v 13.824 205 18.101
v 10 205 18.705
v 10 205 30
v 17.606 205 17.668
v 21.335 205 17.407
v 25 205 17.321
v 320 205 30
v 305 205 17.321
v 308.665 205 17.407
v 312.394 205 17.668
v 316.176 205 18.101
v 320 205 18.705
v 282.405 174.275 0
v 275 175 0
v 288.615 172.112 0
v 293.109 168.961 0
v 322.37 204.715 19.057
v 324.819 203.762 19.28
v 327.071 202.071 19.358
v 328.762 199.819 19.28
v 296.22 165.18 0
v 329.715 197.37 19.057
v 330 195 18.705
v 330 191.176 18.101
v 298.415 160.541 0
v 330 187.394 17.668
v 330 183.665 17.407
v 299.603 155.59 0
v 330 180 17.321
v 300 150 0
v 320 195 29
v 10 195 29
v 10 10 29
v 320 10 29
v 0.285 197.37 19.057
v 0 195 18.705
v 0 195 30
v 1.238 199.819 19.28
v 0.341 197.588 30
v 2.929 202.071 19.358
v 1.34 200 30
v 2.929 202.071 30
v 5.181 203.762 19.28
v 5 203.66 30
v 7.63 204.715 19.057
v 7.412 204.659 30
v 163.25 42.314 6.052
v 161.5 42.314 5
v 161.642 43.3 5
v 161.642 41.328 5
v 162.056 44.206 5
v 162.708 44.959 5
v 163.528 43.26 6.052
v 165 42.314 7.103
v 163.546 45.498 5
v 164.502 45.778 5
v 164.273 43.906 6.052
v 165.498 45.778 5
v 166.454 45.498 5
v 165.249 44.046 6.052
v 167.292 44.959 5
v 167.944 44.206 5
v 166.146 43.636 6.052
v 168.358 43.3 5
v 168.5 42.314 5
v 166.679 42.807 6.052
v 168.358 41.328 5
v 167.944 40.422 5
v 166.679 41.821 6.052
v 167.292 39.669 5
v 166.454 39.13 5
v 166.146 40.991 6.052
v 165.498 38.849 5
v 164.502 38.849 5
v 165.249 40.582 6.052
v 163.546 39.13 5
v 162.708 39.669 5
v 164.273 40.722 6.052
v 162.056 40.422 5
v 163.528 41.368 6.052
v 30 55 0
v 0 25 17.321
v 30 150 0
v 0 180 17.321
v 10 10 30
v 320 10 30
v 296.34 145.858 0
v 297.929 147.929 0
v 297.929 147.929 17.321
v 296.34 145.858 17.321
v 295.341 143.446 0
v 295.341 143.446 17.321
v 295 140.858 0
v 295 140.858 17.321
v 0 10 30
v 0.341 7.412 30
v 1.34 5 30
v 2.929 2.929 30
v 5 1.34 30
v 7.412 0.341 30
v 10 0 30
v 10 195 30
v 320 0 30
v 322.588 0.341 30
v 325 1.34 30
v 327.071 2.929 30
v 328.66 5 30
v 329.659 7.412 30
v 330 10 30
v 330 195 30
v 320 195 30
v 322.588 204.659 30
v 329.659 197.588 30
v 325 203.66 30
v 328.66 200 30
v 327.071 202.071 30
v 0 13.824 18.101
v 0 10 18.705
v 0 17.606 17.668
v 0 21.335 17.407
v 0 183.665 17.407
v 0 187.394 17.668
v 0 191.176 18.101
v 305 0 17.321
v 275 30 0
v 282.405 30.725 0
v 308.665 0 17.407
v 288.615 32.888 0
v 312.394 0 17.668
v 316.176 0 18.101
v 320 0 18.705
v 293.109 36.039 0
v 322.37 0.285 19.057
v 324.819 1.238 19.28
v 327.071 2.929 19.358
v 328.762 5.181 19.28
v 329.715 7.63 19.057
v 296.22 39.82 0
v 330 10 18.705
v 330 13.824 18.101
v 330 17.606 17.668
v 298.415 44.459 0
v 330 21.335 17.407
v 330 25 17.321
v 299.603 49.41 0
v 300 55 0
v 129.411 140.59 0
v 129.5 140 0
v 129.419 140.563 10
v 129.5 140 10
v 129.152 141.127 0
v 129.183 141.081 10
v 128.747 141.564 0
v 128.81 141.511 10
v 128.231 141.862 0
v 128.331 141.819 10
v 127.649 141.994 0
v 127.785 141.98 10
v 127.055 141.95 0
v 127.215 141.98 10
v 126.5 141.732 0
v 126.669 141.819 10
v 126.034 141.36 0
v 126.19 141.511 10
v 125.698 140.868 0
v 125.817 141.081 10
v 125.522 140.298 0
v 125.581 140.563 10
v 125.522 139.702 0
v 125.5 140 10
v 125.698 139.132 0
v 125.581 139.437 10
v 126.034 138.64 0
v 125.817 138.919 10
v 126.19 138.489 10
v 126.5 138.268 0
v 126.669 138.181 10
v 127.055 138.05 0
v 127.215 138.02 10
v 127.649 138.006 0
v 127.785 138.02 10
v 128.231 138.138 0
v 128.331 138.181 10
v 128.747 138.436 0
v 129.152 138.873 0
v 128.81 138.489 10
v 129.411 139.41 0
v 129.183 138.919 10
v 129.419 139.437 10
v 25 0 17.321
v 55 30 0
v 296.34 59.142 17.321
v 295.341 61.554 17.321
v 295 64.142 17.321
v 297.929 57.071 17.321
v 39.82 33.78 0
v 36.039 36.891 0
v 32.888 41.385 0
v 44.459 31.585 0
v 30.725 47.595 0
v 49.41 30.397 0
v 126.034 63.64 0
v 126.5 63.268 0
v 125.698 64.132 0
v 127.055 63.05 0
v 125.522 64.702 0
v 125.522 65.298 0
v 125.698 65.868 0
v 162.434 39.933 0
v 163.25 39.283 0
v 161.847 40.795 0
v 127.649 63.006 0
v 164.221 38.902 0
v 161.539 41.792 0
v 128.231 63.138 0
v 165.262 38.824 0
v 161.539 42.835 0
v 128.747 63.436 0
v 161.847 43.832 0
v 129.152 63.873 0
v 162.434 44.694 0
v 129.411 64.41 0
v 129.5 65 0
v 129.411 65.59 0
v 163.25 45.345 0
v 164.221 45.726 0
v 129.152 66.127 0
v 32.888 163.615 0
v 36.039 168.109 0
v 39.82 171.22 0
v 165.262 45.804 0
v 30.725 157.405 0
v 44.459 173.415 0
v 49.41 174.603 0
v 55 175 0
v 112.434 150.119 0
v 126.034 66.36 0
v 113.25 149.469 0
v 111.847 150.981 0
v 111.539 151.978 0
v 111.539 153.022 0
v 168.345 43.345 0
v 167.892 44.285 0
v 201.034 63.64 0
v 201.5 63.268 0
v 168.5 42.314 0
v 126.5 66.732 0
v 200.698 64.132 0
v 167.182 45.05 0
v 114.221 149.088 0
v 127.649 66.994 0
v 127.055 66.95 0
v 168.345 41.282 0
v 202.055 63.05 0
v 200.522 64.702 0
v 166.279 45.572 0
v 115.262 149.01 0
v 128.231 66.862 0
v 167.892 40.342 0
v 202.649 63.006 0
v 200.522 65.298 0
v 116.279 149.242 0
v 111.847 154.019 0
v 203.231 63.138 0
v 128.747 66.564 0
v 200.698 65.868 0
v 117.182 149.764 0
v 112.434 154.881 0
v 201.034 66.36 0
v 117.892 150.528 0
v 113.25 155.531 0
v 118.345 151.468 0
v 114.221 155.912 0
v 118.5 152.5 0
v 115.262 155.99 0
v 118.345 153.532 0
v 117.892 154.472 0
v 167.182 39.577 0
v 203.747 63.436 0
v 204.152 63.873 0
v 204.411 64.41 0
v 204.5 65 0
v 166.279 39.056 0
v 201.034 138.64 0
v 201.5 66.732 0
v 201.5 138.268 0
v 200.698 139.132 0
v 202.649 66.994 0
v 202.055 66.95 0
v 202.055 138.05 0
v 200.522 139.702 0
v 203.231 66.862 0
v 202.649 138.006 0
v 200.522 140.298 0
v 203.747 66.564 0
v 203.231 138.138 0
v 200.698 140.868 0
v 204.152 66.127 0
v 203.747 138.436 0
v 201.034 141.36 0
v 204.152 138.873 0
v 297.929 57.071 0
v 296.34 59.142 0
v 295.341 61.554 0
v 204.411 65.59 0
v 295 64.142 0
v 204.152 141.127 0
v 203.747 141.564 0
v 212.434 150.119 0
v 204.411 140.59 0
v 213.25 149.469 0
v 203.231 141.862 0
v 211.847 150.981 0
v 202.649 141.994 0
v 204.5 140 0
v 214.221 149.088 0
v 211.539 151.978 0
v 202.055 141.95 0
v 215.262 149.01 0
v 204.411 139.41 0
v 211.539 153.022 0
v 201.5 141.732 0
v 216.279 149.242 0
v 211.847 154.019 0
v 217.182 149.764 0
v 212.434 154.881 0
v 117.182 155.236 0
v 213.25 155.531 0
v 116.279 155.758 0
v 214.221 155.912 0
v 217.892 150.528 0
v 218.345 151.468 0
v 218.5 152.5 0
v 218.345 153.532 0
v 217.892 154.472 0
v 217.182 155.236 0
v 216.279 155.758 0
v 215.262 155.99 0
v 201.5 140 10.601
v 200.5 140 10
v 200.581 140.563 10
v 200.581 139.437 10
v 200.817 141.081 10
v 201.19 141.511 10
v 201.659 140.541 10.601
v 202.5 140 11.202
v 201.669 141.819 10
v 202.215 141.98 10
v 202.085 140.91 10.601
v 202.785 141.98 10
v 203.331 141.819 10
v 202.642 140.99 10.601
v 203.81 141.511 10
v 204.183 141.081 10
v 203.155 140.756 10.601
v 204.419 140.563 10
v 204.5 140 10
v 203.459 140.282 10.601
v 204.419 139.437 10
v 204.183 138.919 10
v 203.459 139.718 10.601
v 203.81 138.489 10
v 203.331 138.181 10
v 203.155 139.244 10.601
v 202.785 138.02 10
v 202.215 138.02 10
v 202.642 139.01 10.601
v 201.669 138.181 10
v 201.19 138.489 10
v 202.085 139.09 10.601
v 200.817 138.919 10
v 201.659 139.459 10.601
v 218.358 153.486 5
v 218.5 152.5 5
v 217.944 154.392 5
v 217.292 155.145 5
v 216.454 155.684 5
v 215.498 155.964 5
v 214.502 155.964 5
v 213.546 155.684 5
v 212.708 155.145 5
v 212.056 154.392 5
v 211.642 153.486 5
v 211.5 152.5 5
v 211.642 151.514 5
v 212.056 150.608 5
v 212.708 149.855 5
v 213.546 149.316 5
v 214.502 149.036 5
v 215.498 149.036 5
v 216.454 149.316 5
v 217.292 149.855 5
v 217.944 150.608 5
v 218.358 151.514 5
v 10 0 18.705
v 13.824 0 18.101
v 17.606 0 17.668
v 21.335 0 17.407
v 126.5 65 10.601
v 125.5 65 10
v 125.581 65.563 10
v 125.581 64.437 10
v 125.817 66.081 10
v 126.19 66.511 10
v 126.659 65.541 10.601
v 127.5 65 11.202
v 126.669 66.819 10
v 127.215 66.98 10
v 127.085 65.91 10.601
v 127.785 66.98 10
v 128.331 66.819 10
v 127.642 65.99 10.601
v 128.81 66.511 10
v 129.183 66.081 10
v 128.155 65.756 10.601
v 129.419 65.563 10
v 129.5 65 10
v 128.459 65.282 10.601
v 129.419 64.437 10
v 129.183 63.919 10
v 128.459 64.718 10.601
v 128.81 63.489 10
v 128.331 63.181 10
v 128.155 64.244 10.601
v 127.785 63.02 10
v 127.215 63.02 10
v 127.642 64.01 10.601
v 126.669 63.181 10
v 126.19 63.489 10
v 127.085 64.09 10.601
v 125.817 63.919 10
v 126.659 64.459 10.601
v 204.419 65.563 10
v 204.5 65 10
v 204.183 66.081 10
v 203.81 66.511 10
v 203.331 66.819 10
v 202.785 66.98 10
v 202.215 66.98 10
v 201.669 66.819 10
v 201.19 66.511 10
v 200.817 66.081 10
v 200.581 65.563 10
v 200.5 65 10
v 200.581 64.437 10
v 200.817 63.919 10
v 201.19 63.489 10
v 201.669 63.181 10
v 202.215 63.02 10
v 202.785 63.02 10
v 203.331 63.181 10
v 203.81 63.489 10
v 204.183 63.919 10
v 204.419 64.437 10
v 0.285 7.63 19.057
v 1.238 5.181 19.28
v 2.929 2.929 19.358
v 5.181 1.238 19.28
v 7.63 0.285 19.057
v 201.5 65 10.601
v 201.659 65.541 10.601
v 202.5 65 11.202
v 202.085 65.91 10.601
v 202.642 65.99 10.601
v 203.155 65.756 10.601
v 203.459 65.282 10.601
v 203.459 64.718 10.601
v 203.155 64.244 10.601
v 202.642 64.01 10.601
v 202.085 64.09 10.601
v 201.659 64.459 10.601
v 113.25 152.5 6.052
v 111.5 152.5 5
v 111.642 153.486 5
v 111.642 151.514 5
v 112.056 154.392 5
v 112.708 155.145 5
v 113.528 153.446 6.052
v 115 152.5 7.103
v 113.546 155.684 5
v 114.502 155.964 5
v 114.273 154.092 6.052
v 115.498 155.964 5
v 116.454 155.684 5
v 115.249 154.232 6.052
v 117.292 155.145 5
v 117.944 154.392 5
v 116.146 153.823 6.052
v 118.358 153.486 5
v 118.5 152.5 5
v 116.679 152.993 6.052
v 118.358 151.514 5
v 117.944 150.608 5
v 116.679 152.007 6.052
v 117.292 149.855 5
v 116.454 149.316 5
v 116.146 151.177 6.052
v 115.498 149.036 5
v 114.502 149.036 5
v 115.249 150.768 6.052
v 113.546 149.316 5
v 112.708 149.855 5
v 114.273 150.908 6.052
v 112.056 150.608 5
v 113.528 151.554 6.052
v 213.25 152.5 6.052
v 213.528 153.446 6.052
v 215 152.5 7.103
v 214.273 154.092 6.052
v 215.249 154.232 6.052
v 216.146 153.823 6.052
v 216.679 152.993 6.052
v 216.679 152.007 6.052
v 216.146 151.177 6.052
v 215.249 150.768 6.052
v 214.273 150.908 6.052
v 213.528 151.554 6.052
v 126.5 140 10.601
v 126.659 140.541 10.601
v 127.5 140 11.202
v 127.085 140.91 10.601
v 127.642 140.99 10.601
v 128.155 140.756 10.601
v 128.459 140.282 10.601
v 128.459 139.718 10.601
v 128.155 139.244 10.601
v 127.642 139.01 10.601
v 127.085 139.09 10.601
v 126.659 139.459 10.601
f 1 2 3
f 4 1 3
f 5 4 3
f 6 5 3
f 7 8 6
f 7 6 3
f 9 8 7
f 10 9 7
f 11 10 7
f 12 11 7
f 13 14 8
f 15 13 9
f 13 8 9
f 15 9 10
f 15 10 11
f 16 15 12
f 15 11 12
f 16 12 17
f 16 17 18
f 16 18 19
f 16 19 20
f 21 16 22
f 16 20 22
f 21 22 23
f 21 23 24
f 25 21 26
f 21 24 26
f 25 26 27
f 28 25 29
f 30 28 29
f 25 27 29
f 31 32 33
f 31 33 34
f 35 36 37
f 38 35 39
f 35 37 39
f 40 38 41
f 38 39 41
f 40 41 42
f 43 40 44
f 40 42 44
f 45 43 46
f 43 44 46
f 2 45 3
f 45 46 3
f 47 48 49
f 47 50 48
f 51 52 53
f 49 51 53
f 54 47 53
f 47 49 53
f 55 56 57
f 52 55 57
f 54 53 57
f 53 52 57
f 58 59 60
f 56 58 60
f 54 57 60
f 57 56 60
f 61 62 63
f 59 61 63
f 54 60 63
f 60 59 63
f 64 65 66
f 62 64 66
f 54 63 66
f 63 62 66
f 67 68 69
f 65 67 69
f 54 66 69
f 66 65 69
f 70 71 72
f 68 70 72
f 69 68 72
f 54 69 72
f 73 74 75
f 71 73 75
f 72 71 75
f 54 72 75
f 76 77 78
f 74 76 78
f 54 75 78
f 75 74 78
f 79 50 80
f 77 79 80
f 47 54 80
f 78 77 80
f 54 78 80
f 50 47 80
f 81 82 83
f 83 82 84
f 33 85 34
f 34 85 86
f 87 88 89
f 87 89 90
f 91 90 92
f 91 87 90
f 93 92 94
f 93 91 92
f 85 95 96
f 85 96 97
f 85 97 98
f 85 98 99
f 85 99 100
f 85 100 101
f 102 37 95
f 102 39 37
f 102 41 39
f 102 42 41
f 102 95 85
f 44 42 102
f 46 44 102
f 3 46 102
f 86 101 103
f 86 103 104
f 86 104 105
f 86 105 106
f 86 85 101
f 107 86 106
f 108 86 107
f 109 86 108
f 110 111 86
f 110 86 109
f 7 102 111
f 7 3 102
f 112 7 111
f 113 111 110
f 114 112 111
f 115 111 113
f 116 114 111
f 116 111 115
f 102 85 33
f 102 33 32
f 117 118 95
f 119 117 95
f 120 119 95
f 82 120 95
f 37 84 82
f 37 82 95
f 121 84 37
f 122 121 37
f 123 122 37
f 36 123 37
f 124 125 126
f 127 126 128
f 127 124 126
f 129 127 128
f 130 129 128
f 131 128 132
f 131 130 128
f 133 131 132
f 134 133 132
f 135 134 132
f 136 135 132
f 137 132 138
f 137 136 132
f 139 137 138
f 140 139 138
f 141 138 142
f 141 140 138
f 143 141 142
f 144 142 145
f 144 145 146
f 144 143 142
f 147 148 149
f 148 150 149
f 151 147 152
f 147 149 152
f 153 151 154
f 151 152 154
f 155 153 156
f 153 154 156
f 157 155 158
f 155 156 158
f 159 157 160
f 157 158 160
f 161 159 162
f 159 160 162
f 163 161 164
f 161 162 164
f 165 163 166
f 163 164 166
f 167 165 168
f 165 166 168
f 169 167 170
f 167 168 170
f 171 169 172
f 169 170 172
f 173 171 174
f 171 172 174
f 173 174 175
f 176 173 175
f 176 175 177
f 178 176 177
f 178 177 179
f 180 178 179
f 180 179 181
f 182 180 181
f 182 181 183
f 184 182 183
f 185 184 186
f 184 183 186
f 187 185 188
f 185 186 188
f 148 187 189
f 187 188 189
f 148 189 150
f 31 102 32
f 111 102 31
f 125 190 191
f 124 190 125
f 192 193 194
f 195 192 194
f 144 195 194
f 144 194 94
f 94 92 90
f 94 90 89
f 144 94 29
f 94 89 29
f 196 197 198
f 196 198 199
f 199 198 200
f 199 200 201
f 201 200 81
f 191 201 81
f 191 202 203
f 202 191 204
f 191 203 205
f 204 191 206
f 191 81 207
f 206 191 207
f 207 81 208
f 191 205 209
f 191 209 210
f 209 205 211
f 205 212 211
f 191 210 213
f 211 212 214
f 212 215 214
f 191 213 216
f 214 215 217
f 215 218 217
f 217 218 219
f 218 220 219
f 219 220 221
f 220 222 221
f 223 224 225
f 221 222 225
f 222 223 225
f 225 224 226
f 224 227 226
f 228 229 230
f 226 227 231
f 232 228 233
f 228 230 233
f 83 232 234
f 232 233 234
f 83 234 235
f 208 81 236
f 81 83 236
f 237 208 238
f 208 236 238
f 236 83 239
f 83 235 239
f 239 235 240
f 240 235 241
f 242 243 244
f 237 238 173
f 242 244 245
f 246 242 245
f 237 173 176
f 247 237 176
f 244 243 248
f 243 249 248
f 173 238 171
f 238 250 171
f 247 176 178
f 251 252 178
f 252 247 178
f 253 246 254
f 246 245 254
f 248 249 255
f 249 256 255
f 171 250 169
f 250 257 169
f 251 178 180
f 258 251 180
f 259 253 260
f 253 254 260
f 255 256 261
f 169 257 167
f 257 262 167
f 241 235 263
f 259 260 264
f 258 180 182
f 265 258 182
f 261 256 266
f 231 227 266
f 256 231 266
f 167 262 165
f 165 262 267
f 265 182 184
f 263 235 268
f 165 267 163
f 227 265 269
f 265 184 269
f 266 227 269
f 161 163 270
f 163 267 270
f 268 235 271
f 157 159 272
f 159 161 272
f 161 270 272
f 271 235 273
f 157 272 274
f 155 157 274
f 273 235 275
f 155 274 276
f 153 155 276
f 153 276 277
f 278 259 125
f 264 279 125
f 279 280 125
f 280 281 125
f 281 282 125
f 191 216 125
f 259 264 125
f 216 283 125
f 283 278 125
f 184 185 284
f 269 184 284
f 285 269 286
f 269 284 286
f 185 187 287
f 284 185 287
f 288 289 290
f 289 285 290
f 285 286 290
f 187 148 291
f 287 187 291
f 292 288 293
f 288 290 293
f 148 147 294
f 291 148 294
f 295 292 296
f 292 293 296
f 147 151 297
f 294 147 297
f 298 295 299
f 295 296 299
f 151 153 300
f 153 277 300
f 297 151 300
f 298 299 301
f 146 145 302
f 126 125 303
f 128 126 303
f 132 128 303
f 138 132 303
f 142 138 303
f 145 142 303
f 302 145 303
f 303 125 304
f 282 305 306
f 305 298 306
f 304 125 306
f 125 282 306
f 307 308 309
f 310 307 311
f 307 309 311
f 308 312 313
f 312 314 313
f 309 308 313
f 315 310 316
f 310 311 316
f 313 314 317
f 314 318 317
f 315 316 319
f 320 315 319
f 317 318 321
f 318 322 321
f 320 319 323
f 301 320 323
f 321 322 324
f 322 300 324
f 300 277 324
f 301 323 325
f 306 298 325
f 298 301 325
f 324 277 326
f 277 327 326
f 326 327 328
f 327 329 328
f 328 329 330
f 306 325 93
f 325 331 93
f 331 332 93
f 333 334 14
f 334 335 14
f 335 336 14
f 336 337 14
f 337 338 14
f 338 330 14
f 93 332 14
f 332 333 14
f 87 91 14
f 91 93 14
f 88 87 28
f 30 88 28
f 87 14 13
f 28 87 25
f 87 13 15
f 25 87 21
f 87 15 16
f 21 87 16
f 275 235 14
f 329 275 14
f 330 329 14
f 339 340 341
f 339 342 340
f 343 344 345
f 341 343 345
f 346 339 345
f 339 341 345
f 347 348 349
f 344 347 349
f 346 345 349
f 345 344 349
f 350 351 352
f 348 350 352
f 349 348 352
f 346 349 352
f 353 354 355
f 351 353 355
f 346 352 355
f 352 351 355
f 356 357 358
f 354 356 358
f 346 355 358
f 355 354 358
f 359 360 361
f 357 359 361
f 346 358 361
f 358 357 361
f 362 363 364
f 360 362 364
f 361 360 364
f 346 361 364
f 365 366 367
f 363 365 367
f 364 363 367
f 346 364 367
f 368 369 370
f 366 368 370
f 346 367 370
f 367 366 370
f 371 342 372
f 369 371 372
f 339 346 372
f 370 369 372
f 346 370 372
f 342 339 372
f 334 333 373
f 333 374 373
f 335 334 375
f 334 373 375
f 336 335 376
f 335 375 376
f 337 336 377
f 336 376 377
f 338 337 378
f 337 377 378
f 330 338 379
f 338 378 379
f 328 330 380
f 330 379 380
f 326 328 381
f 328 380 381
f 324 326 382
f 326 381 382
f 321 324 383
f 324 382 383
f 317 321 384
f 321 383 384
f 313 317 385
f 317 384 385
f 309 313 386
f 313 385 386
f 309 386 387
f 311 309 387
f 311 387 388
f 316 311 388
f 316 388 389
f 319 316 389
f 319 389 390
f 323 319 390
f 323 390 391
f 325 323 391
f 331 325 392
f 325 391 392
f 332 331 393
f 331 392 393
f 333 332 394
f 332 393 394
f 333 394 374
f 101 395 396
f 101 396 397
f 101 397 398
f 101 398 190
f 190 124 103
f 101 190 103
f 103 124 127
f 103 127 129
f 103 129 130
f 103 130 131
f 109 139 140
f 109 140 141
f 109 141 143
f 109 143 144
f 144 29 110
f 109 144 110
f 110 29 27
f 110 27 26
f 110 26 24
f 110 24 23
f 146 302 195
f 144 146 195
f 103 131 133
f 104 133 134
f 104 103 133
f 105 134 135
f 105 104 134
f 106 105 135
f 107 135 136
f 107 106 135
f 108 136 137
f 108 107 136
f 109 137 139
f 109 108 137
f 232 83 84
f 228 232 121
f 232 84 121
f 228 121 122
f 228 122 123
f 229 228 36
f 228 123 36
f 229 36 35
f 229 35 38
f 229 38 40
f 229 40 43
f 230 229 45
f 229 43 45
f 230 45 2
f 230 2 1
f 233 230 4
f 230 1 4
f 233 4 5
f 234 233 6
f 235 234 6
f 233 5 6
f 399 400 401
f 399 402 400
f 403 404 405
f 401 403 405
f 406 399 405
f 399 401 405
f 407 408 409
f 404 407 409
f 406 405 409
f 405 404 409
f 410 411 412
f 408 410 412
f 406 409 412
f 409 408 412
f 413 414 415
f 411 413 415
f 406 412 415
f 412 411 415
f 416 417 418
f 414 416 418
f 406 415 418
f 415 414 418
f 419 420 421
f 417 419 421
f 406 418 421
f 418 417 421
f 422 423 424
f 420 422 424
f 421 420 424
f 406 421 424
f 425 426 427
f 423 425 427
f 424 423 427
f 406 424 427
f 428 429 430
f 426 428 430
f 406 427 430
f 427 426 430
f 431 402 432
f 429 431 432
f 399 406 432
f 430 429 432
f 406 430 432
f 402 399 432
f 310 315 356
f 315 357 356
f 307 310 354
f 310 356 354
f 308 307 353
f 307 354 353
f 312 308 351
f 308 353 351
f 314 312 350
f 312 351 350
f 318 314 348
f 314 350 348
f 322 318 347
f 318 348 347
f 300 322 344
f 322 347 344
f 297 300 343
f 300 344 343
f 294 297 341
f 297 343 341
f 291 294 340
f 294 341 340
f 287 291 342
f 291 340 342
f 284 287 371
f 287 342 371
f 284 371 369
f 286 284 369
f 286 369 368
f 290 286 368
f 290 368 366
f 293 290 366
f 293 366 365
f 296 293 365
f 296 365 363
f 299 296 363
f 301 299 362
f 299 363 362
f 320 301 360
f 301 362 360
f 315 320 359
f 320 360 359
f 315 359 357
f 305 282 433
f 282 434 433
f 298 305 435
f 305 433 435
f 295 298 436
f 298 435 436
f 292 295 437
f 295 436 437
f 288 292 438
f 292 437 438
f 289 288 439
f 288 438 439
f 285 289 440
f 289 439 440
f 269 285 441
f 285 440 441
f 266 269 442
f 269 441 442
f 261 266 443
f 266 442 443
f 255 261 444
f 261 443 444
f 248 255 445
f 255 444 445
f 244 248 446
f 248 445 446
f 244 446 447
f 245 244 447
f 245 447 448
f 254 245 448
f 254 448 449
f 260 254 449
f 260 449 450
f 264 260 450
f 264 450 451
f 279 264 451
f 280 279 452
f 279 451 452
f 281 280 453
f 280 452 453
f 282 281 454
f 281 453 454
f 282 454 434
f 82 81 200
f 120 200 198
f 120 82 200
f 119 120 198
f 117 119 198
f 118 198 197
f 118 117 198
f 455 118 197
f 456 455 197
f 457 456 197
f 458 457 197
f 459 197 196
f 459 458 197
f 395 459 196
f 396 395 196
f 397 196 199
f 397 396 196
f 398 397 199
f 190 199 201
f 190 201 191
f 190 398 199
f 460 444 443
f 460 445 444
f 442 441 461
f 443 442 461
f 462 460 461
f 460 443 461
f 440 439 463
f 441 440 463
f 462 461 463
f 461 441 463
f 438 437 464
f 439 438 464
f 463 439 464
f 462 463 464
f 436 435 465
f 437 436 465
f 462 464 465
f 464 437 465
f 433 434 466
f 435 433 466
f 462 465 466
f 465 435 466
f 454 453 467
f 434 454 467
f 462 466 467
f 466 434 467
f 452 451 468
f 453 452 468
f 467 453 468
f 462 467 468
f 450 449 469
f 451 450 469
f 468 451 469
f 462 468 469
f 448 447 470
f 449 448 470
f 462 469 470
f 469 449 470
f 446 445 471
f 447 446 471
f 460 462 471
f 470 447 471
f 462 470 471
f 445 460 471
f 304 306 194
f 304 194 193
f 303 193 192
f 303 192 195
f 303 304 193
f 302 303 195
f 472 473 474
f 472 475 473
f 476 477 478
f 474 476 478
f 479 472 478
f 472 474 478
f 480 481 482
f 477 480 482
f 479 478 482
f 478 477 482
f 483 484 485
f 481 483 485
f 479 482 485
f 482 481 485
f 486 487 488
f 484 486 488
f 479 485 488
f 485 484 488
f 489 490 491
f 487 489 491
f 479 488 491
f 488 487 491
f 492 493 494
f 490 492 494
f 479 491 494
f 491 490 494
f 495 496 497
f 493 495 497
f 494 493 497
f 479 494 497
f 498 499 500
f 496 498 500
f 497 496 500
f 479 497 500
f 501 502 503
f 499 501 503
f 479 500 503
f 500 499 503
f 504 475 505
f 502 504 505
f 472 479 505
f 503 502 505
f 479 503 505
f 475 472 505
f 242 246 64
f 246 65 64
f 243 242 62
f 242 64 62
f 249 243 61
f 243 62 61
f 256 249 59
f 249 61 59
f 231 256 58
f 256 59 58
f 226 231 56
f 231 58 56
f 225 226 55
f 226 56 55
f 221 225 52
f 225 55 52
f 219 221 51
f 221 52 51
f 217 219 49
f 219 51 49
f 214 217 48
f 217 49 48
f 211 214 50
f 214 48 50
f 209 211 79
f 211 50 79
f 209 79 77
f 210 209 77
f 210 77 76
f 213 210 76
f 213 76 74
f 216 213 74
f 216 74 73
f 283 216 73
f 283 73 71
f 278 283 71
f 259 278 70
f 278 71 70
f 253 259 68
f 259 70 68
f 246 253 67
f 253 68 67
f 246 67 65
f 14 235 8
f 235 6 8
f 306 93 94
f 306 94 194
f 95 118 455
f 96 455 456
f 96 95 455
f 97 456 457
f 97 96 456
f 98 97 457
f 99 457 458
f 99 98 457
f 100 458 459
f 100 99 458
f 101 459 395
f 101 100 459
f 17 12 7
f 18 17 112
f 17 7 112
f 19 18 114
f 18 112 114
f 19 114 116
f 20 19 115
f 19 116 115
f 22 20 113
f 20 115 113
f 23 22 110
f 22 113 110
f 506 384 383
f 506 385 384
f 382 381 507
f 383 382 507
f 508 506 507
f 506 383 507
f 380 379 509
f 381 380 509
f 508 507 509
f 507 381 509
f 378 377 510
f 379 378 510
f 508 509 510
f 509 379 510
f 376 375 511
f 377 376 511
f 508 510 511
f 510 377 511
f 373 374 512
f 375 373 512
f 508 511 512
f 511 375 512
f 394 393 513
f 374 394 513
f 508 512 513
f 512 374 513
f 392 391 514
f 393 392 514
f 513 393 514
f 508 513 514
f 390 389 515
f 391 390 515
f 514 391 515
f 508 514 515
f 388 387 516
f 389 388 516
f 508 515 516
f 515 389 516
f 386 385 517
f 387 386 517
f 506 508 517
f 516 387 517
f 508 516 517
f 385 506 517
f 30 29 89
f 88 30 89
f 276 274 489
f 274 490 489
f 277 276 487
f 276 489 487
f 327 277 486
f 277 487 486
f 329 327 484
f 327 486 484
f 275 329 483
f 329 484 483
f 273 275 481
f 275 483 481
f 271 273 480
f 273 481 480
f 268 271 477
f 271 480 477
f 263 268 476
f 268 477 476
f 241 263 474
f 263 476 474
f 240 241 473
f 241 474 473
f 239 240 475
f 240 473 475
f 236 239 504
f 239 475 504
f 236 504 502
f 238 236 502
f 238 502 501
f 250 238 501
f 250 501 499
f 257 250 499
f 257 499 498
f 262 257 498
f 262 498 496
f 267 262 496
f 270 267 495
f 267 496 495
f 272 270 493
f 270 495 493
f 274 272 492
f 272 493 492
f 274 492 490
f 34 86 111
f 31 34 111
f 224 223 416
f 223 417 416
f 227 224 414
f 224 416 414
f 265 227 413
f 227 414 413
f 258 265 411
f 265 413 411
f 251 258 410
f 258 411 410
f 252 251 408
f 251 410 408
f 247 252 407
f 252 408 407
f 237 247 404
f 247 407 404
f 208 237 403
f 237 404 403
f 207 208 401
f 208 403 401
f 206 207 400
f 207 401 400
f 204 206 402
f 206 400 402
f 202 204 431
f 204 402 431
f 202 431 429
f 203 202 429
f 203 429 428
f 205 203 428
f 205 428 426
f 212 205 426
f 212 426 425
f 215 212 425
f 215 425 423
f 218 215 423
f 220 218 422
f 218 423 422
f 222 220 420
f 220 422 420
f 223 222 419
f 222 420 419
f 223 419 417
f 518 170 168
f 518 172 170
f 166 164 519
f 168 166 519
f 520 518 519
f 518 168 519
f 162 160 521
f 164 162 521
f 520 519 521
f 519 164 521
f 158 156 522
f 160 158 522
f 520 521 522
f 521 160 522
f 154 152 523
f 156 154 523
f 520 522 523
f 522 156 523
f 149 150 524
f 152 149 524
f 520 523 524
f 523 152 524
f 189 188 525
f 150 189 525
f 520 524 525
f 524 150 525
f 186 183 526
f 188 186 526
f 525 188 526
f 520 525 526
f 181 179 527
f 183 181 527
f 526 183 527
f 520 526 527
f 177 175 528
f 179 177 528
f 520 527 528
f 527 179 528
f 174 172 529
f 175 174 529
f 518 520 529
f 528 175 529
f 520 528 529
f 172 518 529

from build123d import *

# Parameters (mm, degrees)
ESQUISSE1_W             = 330
ESQUISSE1_H             = 205
BOSS_EXTRU_1_DEPTH      = 30
CHANFREIN1_SIZE         = 30
CHANFREIN1_SIZE2        = 17.320508076
CONG_1_R                = 50
CONG_3_R                = 10
ESQUISSE2_W             = 310
ESQUISSE2_H             = 185
ENL_V_MAT_EXTRU_1_DEPTH = 1
D_GAGEMENT_M42_D        = 4
D_GAGEMENT_M42_DEPTH    = 10
D_GAGEMENT_M42_TIP      = 1.201721238
D_GAGEMENT_M71_D        = 7
D_GAGEMENT_M71_DEPTH    = 5
D_GAGEMENT_M71_TIP      = 2.103012167
ENL_V_MAT_EXTRU_2_DEPTH = 17.320508


with BuildPart() as part:
    # Esquisse1 → Boss.-Extru.1 (new body)
    with BuildSketch(Plane.XY):
        with Locations((165, 102.5)):
            Rectangle(ESQUISSE1_W, ESQUISSE1_H)
    extrude(amount=BOSS_EXTRU_1_DEPTH)

    # Chanfrein1
    chanfrein1_edges = [part.edges().sort_by_distance(p)[0] for p in [
        (165, 205, 0),
        (330, 102.5, 0),
        (165, 0, 0),
        (0, 102.5, 0),
    ]]
    chanfrein1_side = [part.faces().sort_by_distance(p)[0] for p in [
        (165, 102.5, 0),
    ]]
    chamfer(chanfrein1_edges, length=CHANFREIN1_SIZE, length2=CHANFREIN1_SIZE2, reference=chanfrein1_side[0])

    # Congé1
    cong_1_edges = [part.edges().sort_by_distance(p)[0] for p in [
        (315, 15, 8.660254038),
        (15, 15, 8.660254038),
        (315, 190, 8.660254038),
        (15, 190, 8.660254038),
    ]]
    fillet(cong_1_edges, radius=CONG_1_R)

    # Congé3
    cong_3_edges = [part.edges().sort_by_distance(p)[0] for p in [
        (0, 205, 25.524681254),
        (330, 205, 25.524681254),
        (330, 0, 25.524681254),
        (0, 0, 25.524681254),
    ]]
    fillet(cong_3_edges, radius=CONG_3_R)

    # Esquisse2 → Enlèv. mat.-Extru.1 (cut)
    with BuildSketch(Plane.XY.offset(30)):
        with Locations((165, 102.5)):
            Rectangle(ESQUISSE2_W, ESQUISSE2_H)
    extrude(amount=-ENL_V_MAT_EXTRU_1_DEPTH, mode=Mode.SUBTRACT)

    # Dégagement M42
    with Locations(Plane(origin=(0, 0, 0), x_dir=(-1, 0, 0), z_dir=(0, 0, -1))):
        with Locations((-202.5, 65), (-127.5, 140), (-127.5, 65), (-202.5, 140)):
            Hole(D_GAGEMENT_M42_D / 2, depth=D_GAGEMENT_M42_DEPTH)
            with Locations((0, 0, -(D_GAGEMENT_M42_DEPTH + D_GAGEMENT_M42_TIP / 2))):  # 118° drill point
                Cone(0, D_GAGEMENT_M42_D / 2, D_GAGEMENT_M42_TIP, mode=Mode.SUBTRACT)

    # Dégagement M71
    with Locations(Plane(origin=(0, 0, 0), x_dir=(-1, 0, 0), z_dir=(0, 0, -1))):
        with Locations((-215, 152.5), (-115, 152.5), (-165, 42.313793967)):
            Hole(D_GAGEMENT_M71_D / 2, depth=D_GAGEMENT_M71_DEPTH)
            with Locations((0, 0, -(D_GAGEMENT_M71_DEPTH + D_GAGEMENT_M71_TIP / 2))):  # 118° drill point
                Cone(0, D_GAGEMENT_M71_D / 2, D_GAGEMENT_M71_TIP, mode=Mode.SUBTRACT)

    # Esquisse9 → Enlèv. mat.-Extru.2 (cut)
    with BuildSketch(Plane(origin=(0, 0, 0), x_dir=(-1, 0, 0), z_dir=(0, 0, -1))):
        with BuildLine():
            Line((-330, 180), (-297.928932188, 147.928932188))
            ThreePointArc((-297.928932188, 147.928932188), (-295.761204675, 144.6846987), (-295, 140.857864376))
            Line((-295, 140.857864376), (-295, 64.142135624))
            ThreePointArc((-295, 64.142135624), (-295.761204675, 60.3153013), (-297.928932188, 57.071067812))
            Line((-297.928932188, 57.071067812), (-330, 25))
            Line((-330, 25), (-330, 180))
        make_face()
    extrude(amount=-ENL_V_MAT_EXTRU_2_DEPTH, mode=Mode.SUBTRACT)


solid = part.part
